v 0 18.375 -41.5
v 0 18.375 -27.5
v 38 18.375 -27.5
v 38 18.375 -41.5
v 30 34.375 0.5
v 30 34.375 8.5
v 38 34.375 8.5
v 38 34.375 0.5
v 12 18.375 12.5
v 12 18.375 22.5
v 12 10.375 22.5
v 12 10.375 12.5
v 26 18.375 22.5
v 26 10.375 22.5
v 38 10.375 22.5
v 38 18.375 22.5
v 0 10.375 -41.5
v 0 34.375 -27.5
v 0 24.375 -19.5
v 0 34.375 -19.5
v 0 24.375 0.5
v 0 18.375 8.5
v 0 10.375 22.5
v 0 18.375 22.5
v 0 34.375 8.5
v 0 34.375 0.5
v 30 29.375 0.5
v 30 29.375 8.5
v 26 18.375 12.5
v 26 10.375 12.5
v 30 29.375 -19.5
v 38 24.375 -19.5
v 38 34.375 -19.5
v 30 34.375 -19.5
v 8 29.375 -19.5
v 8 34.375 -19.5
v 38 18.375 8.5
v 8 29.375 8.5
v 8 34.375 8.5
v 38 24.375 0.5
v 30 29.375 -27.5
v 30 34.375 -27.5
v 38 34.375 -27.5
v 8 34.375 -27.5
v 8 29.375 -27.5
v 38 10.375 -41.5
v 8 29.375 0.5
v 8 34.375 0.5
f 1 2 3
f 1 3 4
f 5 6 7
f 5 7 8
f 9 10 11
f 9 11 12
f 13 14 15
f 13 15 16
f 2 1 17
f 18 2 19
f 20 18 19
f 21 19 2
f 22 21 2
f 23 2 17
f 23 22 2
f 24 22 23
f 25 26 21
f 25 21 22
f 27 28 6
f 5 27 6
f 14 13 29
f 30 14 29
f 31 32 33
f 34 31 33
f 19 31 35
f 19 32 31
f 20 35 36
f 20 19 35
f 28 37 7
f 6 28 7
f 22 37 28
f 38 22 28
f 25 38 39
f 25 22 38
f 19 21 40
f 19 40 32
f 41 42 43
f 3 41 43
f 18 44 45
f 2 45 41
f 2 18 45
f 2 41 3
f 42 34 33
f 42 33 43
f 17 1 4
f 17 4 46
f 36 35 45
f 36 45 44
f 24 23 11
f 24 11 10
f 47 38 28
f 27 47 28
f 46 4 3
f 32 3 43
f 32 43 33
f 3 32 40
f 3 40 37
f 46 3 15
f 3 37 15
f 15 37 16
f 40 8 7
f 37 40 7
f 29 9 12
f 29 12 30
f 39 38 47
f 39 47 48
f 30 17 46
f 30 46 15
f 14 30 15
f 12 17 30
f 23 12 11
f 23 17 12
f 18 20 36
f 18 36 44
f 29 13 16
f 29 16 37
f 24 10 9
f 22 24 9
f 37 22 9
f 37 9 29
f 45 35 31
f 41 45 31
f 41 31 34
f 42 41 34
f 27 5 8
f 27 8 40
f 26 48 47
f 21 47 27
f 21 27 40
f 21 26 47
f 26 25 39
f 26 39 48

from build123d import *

# Parameters (mm, degrees)
BOSS_EXTRUDE1_DEPTH = 38
SKETCH2_W           = 22
SKETCH2_H           = 10
CUT_EXTRUDE1_DEPTH  = 72.593579496
SKETCH3_W           = 14
SKETCH3_H           = 20
CUT_EXTRUDE2_DEPTH  = 59.5


with BuildPart() as part:
    # Sketch1 → Boss-Extrude1 (new body)
    with BuildSketch(Plane(origin=(0, 0, 0), x_dir=(0, 0, -1), z_dir=(1, 0, 0))):
        Polygon((41.5, 10.375), (-22.5, 10.375), (-22.5, 18.375), (-8.5, 18.375), (-8.5, 34.375), (-0.5, 34.375), (-0.5, 24.375), (19.5, 24.375), (19.5, 34.375), (27.5, 34.375), (27.5, 18.375), (41.5, 18.375), align=None)
    extrude(amount=BOSS_EXTRUDE1_DEPTH)

    # Sketch2 → Cut-Extrude1 (cut, through all)
    with BuildSketch(Plane.XY.offset(8.5)):
        with Locations((19, 34.375)):
            Rectangle(SKETCH2_W, SKETCH2_H)
    extrude(amount=-CUT_EXTRUDE1_DEPTH, mode=Mode.SUBTRACT)

    # Sketch3 → Cut-Extrude2 (cut, through all)
    with BuildSketch(Plane(origin=(0, 18.375, 0), x_dir=(1, 0, 0), z_dir=(0, 1, 0))):
        with Locations((19, -22.5)):
            Rectangle(SKETCH3_W, SKETCH3_H)
    extrude(amount=-CUT_EXTRUDE2_DEPTH, mode=Mode.SUBTRACT)


solid = part.part
